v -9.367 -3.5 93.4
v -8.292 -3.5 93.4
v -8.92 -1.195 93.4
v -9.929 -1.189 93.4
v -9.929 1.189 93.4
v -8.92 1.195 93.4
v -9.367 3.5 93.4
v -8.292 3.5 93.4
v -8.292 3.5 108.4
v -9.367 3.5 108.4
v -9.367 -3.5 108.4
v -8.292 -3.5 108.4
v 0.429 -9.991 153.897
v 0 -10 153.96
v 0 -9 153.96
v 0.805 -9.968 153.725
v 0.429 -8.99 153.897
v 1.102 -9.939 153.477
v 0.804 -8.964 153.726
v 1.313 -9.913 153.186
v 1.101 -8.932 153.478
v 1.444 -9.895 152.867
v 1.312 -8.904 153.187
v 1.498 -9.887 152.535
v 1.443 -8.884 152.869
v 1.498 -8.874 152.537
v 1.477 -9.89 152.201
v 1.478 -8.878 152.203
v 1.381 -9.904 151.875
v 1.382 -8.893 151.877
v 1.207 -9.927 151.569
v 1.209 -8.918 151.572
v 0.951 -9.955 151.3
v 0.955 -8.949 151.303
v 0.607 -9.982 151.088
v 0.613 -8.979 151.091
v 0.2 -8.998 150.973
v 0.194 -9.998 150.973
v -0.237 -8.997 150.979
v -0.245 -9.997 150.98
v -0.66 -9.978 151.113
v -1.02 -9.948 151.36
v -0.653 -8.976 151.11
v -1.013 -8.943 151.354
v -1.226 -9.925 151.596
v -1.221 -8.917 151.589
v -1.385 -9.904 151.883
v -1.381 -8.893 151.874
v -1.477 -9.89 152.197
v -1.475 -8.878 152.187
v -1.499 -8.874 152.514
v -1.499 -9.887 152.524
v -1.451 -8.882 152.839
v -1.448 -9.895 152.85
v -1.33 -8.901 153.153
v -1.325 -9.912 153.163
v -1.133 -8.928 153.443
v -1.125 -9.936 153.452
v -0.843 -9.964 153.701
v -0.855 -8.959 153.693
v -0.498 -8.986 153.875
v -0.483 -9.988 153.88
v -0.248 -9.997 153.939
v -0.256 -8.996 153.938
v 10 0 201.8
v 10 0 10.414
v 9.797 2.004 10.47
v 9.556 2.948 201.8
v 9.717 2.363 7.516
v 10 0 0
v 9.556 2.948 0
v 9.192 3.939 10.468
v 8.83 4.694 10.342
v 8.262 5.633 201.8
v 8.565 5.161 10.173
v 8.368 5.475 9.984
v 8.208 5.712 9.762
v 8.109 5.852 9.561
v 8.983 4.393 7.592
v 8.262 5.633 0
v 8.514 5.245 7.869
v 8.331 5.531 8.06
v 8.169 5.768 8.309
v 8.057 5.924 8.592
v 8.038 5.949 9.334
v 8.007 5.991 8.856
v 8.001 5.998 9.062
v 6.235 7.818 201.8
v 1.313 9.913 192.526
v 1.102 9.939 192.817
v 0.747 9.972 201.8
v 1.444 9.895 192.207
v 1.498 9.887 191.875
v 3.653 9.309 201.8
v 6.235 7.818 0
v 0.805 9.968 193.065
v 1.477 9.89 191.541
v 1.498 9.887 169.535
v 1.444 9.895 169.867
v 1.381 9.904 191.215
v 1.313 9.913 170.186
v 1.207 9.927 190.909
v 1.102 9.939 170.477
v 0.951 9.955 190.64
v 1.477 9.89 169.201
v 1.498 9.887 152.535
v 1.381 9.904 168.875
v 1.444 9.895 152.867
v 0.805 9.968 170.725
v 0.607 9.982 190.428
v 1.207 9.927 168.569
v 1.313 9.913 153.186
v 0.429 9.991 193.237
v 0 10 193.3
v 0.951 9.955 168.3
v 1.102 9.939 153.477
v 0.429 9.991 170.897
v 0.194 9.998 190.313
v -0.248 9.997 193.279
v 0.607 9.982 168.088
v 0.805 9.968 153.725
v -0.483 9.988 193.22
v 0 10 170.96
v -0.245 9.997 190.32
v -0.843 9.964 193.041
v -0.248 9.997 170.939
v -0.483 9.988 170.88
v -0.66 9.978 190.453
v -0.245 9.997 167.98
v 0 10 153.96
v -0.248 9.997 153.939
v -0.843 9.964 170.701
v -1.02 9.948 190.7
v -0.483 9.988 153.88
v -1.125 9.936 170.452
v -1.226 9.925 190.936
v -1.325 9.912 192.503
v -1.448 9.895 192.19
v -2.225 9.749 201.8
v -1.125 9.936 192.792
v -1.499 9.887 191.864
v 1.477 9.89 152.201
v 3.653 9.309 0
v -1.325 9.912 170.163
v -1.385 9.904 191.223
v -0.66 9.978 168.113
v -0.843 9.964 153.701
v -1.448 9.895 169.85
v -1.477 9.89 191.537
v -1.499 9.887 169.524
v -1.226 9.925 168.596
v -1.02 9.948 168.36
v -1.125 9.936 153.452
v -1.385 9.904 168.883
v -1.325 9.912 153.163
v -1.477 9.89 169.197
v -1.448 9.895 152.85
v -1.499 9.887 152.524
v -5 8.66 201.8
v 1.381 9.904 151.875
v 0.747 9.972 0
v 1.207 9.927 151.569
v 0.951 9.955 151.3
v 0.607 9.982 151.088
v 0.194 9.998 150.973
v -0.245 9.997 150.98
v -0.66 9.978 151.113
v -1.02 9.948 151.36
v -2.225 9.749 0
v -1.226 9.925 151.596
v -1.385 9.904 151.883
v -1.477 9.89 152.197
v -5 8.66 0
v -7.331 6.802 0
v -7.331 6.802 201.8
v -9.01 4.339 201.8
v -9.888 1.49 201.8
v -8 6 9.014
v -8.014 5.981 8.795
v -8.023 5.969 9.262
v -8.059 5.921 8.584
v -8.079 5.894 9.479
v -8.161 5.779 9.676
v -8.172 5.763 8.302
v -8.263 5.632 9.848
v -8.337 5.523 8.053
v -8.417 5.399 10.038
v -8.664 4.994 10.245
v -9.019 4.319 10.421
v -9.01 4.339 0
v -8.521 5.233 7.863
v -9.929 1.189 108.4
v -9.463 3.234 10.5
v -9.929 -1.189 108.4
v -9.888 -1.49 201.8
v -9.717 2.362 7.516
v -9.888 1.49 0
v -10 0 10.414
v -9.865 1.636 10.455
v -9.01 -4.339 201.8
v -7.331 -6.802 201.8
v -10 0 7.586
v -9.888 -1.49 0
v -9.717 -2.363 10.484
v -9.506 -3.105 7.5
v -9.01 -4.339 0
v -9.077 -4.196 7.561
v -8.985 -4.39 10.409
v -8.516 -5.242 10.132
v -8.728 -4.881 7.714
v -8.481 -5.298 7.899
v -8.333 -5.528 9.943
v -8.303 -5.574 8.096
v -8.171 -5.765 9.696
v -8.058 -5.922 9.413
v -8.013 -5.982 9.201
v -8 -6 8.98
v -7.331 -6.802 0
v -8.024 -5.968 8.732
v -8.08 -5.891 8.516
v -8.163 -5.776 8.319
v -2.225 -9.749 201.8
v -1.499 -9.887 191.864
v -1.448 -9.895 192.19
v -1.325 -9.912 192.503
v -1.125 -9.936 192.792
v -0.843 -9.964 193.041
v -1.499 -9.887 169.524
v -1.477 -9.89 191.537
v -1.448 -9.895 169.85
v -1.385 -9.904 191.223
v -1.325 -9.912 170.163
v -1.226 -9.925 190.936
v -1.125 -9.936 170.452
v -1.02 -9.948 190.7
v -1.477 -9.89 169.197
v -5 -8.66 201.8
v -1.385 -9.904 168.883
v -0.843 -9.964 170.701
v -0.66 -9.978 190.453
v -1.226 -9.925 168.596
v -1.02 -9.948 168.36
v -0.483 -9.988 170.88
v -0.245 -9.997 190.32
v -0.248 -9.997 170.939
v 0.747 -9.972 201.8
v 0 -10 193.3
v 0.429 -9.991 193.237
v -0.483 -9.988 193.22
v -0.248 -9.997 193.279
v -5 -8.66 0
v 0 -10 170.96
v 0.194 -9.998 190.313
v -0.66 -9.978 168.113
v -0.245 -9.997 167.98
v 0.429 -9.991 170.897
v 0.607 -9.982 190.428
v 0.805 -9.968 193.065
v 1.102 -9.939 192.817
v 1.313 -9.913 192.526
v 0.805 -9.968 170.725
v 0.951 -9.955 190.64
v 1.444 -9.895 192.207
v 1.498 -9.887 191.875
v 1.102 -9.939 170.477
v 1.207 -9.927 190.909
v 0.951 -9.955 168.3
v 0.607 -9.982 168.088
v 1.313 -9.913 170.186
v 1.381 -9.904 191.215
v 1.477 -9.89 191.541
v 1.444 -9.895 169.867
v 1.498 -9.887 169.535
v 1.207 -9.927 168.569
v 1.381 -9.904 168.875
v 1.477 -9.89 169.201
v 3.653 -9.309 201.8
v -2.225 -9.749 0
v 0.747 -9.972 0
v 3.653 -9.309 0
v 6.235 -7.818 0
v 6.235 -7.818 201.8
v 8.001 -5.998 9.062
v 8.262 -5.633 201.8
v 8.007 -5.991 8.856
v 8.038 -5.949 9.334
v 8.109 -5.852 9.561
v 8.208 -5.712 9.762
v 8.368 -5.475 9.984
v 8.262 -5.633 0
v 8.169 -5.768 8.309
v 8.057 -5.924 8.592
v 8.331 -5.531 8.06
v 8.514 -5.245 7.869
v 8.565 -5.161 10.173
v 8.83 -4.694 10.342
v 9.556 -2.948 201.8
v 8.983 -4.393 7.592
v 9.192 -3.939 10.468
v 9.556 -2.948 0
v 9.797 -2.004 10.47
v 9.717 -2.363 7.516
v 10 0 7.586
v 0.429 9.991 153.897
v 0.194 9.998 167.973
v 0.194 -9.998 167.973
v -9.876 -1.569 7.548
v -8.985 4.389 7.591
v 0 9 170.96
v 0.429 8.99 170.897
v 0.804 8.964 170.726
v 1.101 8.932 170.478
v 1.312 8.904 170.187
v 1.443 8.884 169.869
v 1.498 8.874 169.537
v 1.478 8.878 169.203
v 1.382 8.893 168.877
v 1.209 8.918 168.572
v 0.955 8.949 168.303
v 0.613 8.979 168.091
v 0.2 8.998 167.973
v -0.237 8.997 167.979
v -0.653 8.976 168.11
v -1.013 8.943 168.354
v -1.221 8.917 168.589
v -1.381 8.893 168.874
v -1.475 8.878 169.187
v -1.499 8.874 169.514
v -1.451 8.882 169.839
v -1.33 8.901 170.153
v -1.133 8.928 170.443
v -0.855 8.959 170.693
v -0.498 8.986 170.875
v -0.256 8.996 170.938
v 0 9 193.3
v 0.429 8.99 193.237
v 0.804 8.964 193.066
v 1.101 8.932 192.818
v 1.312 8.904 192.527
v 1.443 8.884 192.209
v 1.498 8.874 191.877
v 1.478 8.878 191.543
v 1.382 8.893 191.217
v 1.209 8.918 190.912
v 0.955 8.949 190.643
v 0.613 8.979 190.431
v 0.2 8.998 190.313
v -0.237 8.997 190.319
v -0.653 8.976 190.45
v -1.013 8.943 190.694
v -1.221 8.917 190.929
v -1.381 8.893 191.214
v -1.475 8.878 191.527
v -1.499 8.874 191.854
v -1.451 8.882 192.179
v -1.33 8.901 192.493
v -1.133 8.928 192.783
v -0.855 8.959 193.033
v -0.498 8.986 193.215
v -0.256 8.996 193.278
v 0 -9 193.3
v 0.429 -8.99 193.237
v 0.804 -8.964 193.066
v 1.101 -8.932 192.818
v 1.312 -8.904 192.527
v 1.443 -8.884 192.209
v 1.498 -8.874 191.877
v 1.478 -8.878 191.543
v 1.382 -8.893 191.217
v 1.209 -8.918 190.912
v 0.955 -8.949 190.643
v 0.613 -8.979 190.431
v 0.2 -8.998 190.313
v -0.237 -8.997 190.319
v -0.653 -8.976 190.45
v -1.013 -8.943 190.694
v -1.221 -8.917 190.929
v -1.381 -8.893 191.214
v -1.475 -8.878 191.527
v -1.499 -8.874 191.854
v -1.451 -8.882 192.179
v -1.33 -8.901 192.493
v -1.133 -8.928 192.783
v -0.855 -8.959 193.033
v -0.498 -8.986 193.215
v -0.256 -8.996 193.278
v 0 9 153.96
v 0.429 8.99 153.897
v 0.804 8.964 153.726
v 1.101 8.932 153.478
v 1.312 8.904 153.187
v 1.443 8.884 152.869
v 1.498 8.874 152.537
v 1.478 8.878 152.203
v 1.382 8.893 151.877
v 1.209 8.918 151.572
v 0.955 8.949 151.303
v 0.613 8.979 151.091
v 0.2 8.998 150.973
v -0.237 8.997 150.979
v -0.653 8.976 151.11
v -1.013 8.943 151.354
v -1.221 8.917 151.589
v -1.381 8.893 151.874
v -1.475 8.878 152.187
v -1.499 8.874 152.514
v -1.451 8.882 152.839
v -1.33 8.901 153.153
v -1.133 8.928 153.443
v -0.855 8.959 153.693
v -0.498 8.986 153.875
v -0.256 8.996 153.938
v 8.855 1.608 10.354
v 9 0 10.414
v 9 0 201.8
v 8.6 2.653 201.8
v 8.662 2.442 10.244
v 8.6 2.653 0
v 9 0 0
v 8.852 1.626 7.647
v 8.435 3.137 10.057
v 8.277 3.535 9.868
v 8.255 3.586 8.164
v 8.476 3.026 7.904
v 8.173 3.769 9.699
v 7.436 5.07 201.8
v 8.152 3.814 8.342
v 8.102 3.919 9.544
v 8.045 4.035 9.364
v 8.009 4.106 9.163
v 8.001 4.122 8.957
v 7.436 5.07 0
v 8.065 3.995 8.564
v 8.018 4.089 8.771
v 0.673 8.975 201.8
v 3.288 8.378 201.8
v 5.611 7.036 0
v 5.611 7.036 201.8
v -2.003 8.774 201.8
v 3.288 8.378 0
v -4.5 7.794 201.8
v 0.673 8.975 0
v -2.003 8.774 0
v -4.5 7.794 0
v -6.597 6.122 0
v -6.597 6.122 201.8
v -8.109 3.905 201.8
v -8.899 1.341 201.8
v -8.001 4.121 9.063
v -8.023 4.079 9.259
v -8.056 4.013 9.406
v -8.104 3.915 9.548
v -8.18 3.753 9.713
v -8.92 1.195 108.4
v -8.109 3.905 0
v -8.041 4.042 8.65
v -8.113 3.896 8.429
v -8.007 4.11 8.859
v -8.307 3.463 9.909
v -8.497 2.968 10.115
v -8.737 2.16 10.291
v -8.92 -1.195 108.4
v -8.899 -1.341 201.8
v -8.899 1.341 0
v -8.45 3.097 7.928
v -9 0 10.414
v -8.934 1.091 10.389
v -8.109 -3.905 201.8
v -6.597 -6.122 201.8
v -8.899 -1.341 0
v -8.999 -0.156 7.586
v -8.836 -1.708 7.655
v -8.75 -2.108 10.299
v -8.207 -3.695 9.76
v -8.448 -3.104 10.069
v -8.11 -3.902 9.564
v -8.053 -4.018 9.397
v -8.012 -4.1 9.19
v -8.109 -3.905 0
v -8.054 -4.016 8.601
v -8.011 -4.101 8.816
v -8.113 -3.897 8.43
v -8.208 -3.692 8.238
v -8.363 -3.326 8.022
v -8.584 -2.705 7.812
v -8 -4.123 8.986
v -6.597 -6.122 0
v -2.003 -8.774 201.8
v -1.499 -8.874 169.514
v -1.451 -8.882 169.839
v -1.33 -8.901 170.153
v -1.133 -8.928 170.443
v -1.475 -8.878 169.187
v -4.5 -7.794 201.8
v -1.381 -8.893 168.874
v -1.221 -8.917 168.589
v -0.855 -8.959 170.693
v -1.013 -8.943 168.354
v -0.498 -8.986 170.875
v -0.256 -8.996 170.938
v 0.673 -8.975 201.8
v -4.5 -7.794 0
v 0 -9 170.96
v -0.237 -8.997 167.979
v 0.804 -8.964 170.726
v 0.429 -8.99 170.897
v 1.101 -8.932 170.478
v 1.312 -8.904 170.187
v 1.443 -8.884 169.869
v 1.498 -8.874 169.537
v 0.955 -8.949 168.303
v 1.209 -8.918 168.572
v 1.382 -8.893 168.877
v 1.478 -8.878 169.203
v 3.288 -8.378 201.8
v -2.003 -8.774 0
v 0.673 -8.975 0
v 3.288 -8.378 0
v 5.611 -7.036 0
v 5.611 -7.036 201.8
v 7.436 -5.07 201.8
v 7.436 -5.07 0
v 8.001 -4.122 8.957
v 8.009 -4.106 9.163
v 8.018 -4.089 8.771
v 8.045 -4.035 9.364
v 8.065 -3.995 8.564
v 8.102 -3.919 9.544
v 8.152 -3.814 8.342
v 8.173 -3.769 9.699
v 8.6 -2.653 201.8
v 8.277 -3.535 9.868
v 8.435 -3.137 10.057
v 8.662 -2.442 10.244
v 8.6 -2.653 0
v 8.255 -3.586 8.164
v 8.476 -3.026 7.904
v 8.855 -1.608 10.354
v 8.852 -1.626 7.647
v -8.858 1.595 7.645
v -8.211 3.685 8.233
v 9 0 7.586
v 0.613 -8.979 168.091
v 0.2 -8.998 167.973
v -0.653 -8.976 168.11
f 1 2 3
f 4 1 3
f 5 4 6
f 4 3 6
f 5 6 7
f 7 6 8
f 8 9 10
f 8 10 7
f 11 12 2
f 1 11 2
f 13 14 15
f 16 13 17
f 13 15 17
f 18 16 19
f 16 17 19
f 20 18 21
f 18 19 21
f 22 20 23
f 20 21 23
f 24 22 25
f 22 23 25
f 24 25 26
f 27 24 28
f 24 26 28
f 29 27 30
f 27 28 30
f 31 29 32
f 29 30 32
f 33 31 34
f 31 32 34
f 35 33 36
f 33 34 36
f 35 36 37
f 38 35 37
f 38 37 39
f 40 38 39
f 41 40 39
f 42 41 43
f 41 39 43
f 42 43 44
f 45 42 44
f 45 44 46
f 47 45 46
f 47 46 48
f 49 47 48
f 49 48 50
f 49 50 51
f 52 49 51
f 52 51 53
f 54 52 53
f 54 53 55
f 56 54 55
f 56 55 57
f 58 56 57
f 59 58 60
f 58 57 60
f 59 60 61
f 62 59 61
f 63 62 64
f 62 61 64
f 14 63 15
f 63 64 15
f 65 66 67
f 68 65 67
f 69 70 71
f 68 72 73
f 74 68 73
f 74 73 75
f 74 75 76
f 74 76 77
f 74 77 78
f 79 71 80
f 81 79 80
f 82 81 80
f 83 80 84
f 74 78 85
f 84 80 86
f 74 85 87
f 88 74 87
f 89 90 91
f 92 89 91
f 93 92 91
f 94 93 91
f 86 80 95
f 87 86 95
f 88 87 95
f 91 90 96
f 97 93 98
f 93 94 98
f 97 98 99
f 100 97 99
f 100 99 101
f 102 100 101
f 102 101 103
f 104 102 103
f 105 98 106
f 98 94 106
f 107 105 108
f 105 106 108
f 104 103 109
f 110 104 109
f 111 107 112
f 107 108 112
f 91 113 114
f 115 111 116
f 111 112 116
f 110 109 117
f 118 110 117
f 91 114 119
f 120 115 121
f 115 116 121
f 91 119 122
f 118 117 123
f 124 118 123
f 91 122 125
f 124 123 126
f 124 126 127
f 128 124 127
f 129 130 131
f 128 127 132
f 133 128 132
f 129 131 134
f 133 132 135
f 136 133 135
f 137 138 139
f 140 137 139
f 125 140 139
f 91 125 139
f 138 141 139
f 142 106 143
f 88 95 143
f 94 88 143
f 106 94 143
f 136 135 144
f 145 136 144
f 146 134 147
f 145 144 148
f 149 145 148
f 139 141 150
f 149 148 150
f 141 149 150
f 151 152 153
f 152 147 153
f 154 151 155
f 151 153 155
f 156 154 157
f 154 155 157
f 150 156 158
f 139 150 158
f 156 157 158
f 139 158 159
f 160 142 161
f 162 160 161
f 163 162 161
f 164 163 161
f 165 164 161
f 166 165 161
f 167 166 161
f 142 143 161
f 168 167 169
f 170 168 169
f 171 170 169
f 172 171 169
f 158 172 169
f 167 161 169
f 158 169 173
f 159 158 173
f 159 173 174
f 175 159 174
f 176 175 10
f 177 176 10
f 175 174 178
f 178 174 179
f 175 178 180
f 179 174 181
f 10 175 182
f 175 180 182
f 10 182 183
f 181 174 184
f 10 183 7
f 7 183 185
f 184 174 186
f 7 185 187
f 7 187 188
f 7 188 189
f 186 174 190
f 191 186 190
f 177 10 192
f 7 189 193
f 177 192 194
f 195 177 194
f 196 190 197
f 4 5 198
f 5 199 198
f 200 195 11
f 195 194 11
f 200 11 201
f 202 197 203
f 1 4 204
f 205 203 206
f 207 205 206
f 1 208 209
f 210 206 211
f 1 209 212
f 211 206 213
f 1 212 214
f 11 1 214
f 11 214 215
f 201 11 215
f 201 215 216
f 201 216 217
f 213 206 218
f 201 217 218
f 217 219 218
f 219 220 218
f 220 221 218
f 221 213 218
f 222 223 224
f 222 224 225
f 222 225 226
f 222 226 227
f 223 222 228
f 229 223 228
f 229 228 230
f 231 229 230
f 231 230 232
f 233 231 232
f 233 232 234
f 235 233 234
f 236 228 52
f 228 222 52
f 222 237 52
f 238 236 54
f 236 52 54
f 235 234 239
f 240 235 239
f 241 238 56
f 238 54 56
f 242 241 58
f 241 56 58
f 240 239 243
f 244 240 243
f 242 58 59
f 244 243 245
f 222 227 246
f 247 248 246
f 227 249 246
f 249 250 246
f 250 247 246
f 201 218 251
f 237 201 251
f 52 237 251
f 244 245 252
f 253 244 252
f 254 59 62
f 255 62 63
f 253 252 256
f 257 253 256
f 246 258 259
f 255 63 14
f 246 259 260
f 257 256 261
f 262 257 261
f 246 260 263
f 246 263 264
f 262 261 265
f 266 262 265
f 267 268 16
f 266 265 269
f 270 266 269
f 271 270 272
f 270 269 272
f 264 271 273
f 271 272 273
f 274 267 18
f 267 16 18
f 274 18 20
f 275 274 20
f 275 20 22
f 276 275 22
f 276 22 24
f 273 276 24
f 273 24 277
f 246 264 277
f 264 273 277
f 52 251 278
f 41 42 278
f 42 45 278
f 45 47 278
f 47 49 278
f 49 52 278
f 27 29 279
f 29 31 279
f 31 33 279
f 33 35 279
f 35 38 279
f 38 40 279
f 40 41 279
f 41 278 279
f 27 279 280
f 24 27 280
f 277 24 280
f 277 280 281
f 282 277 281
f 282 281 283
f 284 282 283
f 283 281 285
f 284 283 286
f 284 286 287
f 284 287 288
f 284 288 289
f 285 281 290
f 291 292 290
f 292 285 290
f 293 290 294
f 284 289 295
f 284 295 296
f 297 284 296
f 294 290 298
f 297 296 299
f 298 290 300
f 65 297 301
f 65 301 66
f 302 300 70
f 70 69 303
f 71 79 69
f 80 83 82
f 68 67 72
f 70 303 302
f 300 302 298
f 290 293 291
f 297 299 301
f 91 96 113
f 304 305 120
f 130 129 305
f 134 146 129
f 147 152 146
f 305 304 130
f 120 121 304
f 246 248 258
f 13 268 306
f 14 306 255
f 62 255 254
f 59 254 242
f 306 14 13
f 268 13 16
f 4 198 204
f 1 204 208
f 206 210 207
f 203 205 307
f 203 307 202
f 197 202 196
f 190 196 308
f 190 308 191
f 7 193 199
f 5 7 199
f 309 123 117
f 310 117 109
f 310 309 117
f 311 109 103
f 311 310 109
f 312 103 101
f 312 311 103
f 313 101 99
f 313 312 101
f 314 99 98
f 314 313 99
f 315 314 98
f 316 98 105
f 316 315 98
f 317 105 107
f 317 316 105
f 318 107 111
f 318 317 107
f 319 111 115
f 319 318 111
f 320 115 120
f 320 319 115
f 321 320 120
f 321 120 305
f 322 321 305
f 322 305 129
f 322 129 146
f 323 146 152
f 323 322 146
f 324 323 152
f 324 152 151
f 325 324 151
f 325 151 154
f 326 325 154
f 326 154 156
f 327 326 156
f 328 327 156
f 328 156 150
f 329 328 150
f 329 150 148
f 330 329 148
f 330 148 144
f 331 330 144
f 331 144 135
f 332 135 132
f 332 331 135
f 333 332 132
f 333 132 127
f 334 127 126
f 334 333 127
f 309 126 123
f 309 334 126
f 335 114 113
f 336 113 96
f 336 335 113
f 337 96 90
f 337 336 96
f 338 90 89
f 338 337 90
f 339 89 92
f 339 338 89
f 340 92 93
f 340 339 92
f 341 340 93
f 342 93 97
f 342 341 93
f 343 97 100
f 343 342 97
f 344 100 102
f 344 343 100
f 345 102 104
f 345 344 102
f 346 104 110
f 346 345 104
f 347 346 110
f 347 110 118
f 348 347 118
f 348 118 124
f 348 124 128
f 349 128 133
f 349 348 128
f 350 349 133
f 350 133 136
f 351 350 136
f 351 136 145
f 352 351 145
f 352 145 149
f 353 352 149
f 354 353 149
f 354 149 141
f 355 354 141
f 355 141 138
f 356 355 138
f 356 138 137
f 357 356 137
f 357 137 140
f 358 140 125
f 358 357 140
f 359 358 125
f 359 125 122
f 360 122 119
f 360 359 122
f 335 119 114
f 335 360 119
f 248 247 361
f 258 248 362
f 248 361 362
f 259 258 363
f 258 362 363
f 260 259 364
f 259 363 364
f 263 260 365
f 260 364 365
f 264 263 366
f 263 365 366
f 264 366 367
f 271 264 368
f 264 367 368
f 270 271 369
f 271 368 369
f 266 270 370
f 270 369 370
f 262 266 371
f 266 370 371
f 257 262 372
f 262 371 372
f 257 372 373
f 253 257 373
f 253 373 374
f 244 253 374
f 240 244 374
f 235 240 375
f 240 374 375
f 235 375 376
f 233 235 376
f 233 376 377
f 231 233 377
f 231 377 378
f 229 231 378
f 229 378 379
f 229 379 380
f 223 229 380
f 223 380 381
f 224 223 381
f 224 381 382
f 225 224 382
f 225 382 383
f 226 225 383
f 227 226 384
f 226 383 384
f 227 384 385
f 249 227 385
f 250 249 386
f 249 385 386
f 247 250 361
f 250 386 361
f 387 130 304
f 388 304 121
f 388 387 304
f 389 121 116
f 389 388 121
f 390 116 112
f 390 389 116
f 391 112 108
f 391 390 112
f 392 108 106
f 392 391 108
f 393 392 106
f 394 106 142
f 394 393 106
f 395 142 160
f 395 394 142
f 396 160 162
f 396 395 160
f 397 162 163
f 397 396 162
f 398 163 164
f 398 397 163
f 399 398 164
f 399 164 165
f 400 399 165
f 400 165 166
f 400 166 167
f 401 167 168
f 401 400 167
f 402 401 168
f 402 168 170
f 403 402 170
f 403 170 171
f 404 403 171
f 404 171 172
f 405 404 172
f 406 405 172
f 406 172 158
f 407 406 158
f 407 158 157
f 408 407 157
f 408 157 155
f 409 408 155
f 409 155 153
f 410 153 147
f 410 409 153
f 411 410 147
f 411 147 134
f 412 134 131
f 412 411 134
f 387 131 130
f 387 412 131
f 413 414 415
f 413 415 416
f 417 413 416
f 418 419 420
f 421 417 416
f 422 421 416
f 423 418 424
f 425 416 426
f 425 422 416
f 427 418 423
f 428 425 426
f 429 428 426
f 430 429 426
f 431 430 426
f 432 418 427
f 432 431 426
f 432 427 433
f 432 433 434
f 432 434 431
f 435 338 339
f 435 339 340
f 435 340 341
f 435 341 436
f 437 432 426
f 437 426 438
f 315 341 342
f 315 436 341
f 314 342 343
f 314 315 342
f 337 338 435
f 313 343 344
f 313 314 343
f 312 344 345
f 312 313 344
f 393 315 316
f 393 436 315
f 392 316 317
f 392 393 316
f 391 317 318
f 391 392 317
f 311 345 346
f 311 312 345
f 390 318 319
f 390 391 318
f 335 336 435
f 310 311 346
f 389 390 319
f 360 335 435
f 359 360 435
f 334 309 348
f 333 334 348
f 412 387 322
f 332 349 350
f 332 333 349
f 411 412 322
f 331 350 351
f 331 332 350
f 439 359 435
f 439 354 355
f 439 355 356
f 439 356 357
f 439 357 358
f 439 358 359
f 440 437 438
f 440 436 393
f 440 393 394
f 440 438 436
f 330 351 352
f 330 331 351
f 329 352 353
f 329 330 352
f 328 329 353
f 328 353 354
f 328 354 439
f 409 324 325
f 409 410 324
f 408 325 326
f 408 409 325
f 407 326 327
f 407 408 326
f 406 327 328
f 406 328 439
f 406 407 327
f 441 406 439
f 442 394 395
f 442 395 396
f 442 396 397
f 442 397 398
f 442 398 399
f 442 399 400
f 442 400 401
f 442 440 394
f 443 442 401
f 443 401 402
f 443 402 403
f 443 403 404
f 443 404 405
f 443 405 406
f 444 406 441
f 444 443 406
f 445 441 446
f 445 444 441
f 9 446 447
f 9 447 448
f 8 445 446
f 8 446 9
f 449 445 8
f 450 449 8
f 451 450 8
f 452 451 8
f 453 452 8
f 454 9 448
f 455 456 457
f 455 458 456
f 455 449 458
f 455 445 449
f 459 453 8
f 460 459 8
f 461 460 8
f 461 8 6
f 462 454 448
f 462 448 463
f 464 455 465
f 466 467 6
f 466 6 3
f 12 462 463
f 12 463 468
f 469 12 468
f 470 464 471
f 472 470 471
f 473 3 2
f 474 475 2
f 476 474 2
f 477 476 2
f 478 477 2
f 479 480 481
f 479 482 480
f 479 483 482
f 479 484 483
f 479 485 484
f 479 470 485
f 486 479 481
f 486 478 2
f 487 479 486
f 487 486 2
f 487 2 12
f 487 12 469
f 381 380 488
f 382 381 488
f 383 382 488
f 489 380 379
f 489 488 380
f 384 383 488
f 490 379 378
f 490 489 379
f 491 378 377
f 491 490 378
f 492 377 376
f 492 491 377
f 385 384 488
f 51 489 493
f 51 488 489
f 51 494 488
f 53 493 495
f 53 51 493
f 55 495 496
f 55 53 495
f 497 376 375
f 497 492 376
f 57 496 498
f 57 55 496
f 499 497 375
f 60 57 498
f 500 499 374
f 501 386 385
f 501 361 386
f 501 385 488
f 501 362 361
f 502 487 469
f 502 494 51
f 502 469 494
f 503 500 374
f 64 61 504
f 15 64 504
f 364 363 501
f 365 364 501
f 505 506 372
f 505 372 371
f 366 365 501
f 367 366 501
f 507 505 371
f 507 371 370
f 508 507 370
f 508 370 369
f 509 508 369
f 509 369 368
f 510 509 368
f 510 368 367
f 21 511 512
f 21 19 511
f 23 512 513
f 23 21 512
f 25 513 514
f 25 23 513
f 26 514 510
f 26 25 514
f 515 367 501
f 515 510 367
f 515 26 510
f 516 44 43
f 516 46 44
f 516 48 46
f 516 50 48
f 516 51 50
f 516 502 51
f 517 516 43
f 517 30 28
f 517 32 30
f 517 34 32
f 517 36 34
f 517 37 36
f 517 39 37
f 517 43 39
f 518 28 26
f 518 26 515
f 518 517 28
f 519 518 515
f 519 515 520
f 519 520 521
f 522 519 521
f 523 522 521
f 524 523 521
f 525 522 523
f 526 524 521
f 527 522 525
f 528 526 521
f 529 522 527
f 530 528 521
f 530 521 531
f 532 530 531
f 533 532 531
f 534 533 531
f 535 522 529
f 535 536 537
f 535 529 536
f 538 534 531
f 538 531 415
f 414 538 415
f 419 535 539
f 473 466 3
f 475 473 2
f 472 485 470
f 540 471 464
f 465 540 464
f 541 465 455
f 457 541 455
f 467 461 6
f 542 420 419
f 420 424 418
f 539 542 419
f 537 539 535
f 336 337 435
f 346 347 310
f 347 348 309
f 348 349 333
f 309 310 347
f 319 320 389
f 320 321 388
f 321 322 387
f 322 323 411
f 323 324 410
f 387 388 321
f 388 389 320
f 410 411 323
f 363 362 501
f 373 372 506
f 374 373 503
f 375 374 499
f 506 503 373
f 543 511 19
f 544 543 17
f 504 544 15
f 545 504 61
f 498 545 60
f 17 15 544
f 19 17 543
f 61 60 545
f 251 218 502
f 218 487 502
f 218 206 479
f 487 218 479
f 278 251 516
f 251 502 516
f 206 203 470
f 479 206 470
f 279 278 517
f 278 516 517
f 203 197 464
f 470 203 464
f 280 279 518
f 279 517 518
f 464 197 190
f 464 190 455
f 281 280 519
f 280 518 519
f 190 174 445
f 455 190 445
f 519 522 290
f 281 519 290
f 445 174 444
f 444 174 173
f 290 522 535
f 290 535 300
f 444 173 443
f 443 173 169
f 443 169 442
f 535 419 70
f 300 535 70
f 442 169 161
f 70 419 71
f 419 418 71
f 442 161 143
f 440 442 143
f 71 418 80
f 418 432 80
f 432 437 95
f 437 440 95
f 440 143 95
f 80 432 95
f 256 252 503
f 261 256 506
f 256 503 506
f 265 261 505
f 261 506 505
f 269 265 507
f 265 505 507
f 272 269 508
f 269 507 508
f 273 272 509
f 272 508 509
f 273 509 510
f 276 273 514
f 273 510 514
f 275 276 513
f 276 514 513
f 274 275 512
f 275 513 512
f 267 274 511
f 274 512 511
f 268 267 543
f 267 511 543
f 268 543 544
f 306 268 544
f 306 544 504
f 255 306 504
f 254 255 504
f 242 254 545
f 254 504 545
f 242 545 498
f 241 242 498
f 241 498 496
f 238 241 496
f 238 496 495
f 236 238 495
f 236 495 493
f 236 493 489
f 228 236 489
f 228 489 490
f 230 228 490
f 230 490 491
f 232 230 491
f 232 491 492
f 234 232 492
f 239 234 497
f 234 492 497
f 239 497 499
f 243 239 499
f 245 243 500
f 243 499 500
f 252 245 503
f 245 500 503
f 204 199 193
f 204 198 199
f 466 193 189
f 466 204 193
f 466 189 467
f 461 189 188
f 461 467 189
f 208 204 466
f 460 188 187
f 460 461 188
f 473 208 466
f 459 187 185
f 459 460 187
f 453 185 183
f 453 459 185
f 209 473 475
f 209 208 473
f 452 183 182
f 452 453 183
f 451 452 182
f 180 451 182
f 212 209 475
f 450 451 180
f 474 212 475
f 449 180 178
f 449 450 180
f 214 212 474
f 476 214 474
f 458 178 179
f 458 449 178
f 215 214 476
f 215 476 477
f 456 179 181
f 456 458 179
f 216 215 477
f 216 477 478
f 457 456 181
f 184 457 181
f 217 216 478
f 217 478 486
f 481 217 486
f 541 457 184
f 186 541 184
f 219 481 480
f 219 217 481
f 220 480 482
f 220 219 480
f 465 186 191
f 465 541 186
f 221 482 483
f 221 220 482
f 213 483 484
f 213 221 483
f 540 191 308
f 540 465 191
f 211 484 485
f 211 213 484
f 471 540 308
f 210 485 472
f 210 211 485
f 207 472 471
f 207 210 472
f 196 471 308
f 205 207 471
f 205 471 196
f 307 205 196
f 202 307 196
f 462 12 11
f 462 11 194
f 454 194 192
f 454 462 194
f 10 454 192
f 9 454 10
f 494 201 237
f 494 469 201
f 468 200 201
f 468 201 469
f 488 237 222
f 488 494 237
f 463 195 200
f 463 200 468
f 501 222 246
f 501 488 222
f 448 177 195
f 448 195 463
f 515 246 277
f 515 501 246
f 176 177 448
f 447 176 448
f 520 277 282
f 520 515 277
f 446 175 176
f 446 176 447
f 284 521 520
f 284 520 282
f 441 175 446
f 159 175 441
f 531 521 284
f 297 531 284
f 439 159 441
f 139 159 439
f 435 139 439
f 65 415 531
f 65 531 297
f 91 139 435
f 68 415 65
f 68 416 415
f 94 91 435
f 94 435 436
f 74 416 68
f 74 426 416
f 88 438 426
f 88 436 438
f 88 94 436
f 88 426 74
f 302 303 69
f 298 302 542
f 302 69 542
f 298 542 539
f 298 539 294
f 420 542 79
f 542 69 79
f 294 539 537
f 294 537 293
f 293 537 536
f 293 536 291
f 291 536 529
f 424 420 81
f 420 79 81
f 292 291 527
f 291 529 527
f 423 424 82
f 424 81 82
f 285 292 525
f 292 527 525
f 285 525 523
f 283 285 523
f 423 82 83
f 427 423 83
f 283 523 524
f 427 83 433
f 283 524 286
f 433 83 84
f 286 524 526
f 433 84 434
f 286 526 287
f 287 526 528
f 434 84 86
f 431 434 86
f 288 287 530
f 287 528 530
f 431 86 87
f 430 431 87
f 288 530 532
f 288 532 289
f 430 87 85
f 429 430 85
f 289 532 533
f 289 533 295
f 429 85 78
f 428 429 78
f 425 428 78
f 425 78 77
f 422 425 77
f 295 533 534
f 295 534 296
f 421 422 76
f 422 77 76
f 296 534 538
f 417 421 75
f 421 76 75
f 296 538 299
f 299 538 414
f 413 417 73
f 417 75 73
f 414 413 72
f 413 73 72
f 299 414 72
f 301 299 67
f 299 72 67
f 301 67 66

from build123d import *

# Parameters (mm, degrees)
SKETCH_1_R          = 10
SKETCH_1_R_2        = 9
EXTRUDE_1_DEPTH     = 201.8
SKETCH_2_R          = 1.5
CUT_EXTRUDE_1_DEPTH = 15
SKETCH_3_W          = 15
SKETCH_3_H          = 7
CUT_EXTRUDE_2_DEPTH = 10


with BuildPart() as part:
    # 草图1 → 拉伸-薄壁1 (new body)
    with BuildSketch(Plane.XY):
        Circle(SKETCH_1_R)
        Circle(SKETCH_1_R_2, mode=Mode.SUBTRACT)
    extrude(amount=EXTRUDE_1_DEPTH)

    # 草图2 → 切除-拉伸1 (cut, symmetric)
    with BuildSketch(Plane(origin=(0, 0, 0), x_dir=(1, 0, 0), z_dir=(0, 1, 0))):
        with Locations(Location((0, -152.46, 0), (0, 0, 270))):
            Circle(SKETCH_2_R)
        with Locations(Location((0, -169.46, 0), (0, 0, 270))):
            Circle(SKETCH_2_R)
        with Locations(Location((0, -191.8, 0), (0, 0, 270))):
            Circle(SKETCH_2_R)
        with Locations((-9.5, -9)):
            Circle(SKETCH_2_R)
        with Locations((9.5, -9)):
            Circle(SKETCH_2_R)
    extrude(amount=CUT_EXTRUDE_1_DEPTH, both=True, mode=Mode.SUBTRACT)

    # 草图3 → 切除-拉伸2 (cut)
    with BuildSketch(Plane(origin=(0, 0, 0), x_dir=(0, 0, -1), z_dir=(1, 0, 0))):
        with Locations((-100.9, 0)):
            Rectangle(SKETCH_3_W, SKETCH_3_H)
    extrude(amount=-CUT_EXTRUDE_2_DEPTH, mode=Mode.SUBTRACT)


solid = part.part
